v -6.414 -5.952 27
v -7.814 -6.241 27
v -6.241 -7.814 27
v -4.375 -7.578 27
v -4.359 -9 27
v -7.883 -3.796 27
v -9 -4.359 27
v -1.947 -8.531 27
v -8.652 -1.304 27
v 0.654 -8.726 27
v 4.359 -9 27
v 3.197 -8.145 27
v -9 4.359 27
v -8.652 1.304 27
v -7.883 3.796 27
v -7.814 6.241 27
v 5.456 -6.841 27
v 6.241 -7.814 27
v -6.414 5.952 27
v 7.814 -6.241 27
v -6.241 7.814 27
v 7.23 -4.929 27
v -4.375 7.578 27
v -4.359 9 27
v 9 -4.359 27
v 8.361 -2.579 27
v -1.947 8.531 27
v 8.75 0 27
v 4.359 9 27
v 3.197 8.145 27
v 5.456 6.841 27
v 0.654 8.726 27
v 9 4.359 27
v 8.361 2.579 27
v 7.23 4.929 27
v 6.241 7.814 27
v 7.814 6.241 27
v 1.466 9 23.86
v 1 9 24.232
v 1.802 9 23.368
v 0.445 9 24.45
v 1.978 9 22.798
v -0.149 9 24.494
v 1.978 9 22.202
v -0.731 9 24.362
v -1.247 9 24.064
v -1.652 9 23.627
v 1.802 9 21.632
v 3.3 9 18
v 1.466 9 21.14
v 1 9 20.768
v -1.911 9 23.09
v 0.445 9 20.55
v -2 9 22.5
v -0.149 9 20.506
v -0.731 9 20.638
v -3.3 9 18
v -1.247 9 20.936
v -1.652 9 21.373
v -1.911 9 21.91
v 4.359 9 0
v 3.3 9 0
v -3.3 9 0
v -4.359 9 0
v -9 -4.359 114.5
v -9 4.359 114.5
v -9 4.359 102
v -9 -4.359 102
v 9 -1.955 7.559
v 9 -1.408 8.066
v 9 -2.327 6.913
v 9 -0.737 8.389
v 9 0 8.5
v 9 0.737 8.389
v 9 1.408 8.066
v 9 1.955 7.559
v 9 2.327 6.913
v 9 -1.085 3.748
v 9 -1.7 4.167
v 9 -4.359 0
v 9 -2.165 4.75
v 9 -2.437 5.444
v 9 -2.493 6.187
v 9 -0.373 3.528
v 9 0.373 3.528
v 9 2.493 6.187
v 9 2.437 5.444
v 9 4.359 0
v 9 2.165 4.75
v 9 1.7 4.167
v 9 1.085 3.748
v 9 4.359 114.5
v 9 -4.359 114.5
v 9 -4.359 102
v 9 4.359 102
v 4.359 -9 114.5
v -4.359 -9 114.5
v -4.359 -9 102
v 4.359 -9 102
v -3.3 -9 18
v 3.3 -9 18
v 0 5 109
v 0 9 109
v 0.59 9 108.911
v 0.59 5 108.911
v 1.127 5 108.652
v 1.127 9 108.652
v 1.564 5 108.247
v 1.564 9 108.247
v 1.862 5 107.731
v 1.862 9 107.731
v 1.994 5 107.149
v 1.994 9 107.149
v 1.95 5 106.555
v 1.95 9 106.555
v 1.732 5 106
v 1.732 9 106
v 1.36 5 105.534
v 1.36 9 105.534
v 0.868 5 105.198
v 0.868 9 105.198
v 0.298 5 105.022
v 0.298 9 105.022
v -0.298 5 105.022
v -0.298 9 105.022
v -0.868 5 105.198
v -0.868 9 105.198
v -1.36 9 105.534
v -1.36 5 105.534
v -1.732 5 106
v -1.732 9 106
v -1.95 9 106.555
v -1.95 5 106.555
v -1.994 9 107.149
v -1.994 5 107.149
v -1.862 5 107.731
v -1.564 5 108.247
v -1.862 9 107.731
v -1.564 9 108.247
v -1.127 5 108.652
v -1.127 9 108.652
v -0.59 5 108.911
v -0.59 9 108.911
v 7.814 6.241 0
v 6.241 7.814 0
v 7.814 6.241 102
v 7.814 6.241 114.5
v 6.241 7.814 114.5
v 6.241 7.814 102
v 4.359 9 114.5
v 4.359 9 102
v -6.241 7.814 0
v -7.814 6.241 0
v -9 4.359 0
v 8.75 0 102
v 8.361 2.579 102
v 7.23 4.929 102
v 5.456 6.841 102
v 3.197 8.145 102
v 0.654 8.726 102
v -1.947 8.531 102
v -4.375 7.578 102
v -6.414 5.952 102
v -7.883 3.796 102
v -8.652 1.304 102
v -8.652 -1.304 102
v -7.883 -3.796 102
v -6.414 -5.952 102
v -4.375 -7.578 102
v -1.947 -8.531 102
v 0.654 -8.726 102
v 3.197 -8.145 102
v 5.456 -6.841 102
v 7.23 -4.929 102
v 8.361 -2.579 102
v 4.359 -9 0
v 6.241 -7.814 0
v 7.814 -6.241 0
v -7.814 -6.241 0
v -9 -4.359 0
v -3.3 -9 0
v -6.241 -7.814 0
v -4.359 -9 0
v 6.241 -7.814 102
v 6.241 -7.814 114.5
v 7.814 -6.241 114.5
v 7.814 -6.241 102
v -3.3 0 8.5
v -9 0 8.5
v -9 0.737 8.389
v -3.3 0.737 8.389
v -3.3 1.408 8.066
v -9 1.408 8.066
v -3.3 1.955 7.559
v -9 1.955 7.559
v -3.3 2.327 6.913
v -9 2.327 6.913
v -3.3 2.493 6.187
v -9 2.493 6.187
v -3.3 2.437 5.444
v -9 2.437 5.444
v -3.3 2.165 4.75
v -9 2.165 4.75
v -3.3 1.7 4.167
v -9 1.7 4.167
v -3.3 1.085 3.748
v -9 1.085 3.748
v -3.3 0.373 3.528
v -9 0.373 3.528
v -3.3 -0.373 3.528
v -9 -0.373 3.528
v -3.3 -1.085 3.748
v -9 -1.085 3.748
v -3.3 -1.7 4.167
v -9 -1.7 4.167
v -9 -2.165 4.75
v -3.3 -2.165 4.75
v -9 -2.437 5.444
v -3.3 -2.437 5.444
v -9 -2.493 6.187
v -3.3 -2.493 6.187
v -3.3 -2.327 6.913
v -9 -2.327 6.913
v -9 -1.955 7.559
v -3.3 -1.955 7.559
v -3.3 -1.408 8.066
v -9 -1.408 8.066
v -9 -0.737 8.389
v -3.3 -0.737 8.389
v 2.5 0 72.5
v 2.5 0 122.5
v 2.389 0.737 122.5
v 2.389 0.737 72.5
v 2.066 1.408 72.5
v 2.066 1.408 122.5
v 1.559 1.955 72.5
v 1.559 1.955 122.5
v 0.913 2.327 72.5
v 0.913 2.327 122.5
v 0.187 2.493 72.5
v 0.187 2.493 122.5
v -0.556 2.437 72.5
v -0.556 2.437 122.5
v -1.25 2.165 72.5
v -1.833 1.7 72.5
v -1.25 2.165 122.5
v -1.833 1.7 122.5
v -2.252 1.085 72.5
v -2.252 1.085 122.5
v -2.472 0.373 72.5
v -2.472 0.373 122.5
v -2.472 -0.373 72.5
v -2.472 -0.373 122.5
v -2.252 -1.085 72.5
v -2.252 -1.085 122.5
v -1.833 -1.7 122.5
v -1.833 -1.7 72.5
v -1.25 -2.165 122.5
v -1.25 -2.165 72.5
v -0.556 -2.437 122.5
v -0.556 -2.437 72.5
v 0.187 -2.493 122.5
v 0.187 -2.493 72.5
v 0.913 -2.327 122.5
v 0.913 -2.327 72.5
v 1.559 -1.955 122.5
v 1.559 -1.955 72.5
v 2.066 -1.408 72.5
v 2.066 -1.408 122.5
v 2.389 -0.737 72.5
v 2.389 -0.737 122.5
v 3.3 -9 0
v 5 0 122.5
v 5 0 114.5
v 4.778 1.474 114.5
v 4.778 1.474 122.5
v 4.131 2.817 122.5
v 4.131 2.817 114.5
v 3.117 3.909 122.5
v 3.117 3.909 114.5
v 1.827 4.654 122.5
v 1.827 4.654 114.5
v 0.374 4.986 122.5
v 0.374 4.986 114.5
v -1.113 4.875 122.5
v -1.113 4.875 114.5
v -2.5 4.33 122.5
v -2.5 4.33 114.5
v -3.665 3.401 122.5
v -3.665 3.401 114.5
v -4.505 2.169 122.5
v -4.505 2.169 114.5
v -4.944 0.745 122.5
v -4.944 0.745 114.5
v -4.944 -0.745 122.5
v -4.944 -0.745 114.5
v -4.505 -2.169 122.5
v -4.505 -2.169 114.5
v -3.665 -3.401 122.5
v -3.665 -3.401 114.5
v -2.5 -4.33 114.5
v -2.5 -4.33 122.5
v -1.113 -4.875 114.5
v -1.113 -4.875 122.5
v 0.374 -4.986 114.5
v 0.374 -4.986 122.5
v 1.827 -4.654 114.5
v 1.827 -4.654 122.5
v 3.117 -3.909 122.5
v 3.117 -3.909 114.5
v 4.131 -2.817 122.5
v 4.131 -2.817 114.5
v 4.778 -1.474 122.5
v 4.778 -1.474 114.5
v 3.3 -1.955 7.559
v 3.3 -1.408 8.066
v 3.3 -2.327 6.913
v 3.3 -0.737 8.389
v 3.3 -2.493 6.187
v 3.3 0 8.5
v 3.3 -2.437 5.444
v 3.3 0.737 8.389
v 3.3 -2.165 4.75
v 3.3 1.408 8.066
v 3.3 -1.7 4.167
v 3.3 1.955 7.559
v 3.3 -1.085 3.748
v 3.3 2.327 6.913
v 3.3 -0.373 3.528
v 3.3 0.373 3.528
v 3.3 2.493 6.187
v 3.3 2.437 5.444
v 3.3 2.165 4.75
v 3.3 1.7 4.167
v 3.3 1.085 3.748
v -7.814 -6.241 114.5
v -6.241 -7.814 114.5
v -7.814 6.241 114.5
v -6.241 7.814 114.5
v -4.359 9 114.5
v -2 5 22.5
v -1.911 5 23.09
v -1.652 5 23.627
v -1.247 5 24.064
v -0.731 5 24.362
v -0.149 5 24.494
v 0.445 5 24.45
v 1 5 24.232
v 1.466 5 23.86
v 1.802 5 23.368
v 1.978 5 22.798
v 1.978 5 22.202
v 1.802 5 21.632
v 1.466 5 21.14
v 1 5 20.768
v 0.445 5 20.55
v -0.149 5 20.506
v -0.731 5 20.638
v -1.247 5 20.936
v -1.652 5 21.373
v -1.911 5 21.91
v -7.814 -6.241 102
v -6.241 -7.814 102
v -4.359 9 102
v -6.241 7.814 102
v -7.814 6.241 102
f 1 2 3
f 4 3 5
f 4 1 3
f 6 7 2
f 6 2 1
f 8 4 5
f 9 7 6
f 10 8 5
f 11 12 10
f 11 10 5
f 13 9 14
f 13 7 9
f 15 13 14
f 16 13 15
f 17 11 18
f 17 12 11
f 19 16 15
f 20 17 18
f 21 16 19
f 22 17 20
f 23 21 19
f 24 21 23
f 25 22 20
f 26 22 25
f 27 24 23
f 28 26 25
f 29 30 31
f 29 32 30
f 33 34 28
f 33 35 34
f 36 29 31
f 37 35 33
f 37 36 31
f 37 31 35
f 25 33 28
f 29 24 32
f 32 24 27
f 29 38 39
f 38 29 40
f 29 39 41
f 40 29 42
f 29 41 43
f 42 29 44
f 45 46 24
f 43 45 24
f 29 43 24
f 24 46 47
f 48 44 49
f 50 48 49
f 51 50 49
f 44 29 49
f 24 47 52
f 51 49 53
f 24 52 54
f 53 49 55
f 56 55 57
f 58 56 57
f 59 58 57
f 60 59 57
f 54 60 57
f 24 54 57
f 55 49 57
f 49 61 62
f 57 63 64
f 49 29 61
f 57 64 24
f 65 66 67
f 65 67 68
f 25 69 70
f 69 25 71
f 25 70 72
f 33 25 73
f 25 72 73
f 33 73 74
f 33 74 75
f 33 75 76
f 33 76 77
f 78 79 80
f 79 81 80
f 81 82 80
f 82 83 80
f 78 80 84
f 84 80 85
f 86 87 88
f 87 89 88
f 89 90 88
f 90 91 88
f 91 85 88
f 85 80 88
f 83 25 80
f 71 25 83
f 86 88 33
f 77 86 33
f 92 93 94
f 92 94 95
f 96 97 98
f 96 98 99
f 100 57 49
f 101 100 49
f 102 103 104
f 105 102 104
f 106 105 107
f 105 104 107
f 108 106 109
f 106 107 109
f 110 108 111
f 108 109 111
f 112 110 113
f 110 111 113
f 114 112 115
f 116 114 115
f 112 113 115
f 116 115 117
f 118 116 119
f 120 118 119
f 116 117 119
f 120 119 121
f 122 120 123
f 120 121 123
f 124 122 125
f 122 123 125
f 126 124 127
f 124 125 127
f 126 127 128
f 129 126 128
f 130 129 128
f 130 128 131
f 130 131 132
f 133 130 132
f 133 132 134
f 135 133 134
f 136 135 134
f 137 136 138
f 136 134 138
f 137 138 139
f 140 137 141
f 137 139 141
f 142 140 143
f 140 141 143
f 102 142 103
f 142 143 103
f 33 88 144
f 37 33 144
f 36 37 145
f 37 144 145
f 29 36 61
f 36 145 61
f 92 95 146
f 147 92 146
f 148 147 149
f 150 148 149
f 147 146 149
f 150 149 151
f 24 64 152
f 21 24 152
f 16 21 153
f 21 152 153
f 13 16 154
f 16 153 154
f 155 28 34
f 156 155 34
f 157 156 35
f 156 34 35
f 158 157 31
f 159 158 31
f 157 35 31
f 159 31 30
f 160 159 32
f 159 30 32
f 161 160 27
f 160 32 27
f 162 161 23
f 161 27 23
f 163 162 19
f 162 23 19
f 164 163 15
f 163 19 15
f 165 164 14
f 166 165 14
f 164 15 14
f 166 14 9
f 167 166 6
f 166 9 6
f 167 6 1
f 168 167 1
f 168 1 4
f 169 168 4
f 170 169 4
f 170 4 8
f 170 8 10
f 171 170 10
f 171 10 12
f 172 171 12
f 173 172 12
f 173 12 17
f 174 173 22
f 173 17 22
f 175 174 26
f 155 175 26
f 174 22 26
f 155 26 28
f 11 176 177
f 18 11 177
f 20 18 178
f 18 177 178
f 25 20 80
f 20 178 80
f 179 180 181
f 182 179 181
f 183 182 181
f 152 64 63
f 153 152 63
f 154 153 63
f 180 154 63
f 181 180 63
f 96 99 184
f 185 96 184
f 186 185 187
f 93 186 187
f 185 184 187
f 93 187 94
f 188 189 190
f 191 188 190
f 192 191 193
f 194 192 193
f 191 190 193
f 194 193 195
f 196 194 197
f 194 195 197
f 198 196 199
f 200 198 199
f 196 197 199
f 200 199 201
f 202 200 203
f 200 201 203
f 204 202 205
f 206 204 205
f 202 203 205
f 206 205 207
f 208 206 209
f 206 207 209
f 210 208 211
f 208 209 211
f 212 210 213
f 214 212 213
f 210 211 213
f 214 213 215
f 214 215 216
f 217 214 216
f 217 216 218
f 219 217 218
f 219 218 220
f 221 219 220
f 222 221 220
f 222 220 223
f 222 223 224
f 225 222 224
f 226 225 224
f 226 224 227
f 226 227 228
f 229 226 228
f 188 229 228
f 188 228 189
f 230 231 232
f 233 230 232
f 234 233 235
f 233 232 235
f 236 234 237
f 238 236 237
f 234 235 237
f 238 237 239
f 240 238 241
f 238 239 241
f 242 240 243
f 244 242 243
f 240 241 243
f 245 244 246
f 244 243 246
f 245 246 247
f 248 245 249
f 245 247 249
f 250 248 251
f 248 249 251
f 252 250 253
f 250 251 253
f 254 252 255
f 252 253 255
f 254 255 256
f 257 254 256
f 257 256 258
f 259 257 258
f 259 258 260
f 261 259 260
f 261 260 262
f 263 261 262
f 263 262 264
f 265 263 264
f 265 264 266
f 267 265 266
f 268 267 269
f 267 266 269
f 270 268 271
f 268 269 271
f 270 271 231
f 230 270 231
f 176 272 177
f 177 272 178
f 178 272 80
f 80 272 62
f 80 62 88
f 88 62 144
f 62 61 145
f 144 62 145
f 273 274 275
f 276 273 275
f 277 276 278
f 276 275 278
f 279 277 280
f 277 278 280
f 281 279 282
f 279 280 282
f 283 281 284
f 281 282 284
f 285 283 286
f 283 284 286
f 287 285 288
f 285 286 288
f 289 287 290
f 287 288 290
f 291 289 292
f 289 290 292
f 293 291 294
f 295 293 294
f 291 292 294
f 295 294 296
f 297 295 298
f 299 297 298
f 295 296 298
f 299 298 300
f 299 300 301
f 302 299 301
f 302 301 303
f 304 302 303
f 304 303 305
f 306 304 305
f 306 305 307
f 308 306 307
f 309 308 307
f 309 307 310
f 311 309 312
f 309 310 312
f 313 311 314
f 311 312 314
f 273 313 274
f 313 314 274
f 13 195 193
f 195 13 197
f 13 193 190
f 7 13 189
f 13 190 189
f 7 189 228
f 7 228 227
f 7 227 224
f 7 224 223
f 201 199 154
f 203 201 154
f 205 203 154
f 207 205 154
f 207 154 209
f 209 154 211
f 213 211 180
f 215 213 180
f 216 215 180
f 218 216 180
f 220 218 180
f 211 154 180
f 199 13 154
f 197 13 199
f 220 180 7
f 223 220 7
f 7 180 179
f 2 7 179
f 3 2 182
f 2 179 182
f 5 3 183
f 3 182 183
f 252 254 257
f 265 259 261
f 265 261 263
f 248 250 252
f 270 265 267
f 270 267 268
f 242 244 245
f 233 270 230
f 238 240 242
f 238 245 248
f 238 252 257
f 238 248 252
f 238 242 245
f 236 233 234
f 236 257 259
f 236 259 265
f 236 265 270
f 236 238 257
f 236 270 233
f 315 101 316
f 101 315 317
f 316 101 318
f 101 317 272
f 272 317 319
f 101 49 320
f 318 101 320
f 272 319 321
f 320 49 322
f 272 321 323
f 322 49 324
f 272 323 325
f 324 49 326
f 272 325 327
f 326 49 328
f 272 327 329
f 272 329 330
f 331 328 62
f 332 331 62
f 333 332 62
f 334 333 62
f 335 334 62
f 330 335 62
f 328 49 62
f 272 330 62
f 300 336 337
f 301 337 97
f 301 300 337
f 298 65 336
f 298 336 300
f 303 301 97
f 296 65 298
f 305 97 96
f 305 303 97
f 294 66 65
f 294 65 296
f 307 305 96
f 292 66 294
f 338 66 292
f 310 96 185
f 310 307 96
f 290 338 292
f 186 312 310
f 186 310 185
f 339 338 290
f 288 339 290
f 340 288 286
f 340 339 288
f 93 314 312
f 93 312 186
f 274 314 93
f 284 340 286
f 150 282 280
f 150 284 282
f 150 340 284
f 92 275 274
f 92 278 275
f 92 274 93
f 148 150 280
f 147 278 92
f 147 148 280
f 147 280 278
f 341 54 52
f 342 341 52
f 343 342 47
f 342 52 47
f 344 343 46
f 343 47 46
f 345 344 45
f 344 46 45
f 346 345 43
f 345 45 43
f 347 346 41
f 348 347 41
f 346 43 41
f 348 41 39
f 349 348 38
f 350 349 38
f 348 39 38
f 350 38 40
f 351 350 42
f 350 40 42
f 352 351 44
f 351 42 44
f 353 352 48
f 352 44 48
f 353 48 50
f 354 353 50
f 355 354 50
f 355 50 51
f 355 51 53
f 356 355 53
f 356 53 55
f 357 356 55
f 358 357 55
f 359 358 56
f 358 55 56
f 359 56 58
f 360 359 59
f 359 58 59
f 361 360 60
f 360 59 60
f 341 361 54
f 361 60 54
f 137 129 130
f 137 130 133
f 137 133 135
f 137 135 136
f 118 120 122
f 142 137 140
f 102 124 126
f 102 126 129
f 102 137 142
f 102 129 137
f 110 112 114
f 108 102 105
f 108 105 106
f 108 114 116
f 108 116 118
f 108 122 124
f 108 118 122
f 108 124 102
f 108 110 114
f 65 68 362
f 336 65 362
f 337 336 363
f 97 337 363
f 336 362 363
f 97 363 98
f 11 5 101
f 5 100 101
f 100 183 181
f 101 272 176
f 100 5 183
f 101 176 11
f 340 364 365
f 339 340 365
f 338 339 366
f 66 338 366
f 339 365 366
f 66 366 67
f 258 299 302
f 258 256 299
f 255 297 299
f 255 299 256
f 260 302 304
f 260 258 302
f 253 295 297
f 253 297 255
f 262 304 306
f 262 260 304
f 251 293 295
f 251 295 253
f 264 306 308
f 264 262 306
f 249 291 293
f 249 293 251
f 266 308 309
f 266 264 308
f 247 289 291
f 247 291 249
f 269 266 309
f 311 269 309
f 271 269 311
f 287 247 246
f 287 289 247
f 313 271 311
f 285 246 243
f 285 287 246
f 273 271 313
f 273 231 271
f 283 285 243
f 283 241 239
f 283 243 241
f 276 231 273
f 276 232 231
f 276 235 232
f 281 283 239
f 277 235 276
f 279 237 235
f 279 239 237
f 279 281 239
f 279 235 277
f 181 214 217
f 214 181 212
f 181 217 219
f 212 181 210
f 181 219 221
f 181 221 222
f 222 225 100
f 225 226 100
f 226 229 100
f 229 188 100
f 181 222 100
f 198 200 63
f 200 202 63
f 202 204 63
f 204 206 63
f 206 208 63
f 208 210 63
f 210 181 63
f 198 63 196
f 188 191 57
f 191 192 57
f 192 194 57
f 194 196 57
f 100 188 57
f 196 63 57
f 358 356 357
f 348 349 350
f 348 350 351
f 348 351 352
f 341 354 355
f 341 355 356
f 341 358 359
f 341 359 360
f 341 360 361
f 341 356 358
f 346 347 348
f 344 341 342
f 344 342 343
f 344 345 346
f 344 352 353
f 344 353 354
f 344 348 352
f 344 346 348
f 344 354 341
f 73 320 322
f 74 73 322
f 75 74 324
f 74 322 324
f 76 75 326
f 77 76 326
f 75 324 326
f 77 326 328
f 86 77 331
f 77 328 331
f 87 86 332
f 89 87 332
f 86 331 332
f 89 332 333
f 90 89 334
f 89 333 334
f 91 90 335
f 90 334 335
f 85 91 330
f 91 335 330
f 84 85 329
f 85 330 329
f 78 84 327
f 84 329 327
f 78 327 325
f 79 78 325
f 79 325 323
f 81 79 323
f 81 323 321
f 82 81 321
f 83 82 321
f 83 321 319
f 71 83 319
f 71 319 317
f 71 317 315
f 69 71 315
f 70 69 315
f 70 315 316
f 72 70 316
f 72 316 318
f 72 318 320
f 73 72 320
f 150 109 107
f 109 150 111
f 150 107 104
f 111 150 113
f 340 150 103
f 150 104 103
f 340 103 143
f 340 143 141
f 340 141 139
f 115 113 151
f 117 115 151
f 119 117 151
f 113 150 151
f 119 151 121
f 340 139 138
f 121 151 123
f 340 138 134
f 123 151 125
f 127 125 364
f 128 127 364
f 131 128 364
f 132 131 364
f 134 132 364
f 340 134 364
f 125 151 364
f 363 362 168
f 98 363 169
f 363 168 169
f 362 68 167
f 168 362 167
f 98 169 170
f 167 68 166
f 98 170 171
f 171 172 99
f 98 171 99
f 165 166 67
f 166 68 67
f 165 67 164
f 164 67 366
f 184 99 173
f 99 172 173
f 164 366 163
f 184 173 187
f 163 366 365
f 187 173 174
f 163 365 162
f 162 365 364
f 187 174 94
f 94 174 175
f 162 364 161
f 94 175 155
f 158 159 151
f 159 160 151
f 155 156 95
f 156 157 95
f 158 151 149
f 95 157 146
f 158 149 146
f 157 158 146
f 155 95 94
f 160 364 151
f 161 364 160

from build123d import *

# Parameters (mm, degrees)
BOSS_EXTRUDE1_DEPTH = 27
SKETCH2_R           = 8.75
BOSS_EXTRUDE2_DEPTH = 75
BOSS_EXTRUDE3_DEPTH = 12.5
SKETCH4_R           = 5
BOSS_EXTRUDE4_DEPTH = 8
SKETCH5_R           = 2.5
CUT_EXTRUDE1_DEPTH  = 50
SKETCH6_R           = 2
CUT_EXTRUDE2_DEPTH  = 4
CUT_EXTRUDE4_DEPTH  = 125.142055726
SKETCH10_R          = 2
CUT_EXTRUDE5_DEPTH  = 4
SKETCH11_R          = 2.5
CUT_EXTRUDE6_DEPTH  = 125.142055726


with BuildPart() as part:
    # Sketch1 → Boss-Extrude1 (new body)
    with BuildSketch(Plane.XY):
        with BuildLine():
            Line((-4.358898944, -9), (4.358898944, -9))
            ThreePointArc((4.358898944, -9), (7.071067812, -7.071067812), (9, -4.358898944))
            Line((9, -4.358898944), (9, 4.358898944))
            ThreePointArc((9, 4.358898944), (7.071067812, 7.071067812), (4.358898944, 9))
            Line((4.358898944, 9), (-4.358898944, 9))
            ThreePointArc((-4.358898944, 9), (-7.071067812, 7.071067812), (-9, 4.358898944))
            Line((-9, 4.358898944), (-9, -4.358898944))
            ThreePointArc((-9, -4.358898944), (-7.071067812, -7.071067812), (-4.358898944, -9))
        make_face()
    extrude(amount=BOSS_EXTRUDE1_DEPTH)

    # Sketch2 → Boss-Extrude2 (add)
    with BuildSketch(Plane.XY.offset(27)):
        Circle(SKETCH2_R)
    extrude(amount=BOSS_EXTRUDE2_DEPTH)

    # Sketch3 → Boss-Extrude3 (add)
    with BuildSketch(Plane.XY.offset(102)):
        with BuildLine():
            Line((-4.358898944, -9), (4.358898944, -9))
            ThreePointArc((4.358898944, -9), (7.071067812, -7.071067812), (9, -4.358898944))
            Line((9, -4.358898944), (9, 4.358898944))
            ThreePointArc((9, 4.358898944), (7.071067812, 7.071067812), (4.358898944, 9))
            Line((4.358898944, 9), (-4.358898944, 9))
            ThreePointArc((-4.358898944, 9), (-7.071067812, 7.071067812), (-9, 4.358898944))
            Line((-9, 4.358898944), (-9, -4.358898944))
            ThreePointArc((-9, -4.358898944), (-7.071067812, -7.071067812), (-4.358898944, -9))
        make_face()
    extrude(amount=BOSS_EXTRUDE3_DEPTH)

    # Sketch4 → Boss-Extrude4 (add)
    with BuildSketch(Plane.XY.offset(114.5)):
        Circle(SKETCH4_R)
    extrude(amount=BOSS_EXTRUDE4_DEPTH)

    # Sketch5 → Cut-Extrude1 (cut)
    with BuildSketch(Plane.XY.offset(122.5)):
        Circle(SKETCH5_R)
    extrude(amount=-CUT_EXTRUDE1_DEPTH, mode=Mode.SUBTRACT)

    # Sketch6 → Cut-Extrude2 (cut)
    with BuildSketch(Plane(origin=(0, 9, 0), x_dir=(1, 0, 0), z_dir=(0, 1, 0))):
        with Locations(Location((0, -107, 0), (0, 0, 270))):
            Circle(SKETCH6_R)
    extrude(amount=-CUT_EXTRUDE2_DEPTH, mode=Mode.SUBTRACT)

    # Sketch9 → Cut-Extrude4 (cut, through all)
    with BuildSketch(Plane(origin=(0, 9, 0), x_dir=(1, 0, 0), z_dir=(0, 1, 0))):
        Polygon((3.3, 0), (0, 0), (-3.3, 0), (-3.3, -18), (3.3, -18), align=None)
    extrude(amount=-CUT_EXTRUDE4_DEPTH, mode=Mode.SUBTRACT)

    # Sketch10 → Cut-Extrude5 (cut)
    with BuildSketch(Plane(origin=(0, 9, 0), x_dir=(1, 0, 0), z_dir=(0, 1, 0))):
        with Locations(Location((0, -22.5, 0), (0, 0, 180))):
            Circle(SKETCH10_R)
    extrude(amount=-CUT_EXTRUDE5_DEPTH, mode=Mode.SUBTRACT)

    # Sketch11 → Cut-Extrude6 (cut, through all)
    with BuildSketch(Plane.ZY.offset(9)):
        with Locations((6, 0)):
            Circle(SKETCH11_R)
    extrude(amount=-CUT_EXTRUDE6_DEPTH, mode=Mode.SUBTRACT)


solid = part.part
